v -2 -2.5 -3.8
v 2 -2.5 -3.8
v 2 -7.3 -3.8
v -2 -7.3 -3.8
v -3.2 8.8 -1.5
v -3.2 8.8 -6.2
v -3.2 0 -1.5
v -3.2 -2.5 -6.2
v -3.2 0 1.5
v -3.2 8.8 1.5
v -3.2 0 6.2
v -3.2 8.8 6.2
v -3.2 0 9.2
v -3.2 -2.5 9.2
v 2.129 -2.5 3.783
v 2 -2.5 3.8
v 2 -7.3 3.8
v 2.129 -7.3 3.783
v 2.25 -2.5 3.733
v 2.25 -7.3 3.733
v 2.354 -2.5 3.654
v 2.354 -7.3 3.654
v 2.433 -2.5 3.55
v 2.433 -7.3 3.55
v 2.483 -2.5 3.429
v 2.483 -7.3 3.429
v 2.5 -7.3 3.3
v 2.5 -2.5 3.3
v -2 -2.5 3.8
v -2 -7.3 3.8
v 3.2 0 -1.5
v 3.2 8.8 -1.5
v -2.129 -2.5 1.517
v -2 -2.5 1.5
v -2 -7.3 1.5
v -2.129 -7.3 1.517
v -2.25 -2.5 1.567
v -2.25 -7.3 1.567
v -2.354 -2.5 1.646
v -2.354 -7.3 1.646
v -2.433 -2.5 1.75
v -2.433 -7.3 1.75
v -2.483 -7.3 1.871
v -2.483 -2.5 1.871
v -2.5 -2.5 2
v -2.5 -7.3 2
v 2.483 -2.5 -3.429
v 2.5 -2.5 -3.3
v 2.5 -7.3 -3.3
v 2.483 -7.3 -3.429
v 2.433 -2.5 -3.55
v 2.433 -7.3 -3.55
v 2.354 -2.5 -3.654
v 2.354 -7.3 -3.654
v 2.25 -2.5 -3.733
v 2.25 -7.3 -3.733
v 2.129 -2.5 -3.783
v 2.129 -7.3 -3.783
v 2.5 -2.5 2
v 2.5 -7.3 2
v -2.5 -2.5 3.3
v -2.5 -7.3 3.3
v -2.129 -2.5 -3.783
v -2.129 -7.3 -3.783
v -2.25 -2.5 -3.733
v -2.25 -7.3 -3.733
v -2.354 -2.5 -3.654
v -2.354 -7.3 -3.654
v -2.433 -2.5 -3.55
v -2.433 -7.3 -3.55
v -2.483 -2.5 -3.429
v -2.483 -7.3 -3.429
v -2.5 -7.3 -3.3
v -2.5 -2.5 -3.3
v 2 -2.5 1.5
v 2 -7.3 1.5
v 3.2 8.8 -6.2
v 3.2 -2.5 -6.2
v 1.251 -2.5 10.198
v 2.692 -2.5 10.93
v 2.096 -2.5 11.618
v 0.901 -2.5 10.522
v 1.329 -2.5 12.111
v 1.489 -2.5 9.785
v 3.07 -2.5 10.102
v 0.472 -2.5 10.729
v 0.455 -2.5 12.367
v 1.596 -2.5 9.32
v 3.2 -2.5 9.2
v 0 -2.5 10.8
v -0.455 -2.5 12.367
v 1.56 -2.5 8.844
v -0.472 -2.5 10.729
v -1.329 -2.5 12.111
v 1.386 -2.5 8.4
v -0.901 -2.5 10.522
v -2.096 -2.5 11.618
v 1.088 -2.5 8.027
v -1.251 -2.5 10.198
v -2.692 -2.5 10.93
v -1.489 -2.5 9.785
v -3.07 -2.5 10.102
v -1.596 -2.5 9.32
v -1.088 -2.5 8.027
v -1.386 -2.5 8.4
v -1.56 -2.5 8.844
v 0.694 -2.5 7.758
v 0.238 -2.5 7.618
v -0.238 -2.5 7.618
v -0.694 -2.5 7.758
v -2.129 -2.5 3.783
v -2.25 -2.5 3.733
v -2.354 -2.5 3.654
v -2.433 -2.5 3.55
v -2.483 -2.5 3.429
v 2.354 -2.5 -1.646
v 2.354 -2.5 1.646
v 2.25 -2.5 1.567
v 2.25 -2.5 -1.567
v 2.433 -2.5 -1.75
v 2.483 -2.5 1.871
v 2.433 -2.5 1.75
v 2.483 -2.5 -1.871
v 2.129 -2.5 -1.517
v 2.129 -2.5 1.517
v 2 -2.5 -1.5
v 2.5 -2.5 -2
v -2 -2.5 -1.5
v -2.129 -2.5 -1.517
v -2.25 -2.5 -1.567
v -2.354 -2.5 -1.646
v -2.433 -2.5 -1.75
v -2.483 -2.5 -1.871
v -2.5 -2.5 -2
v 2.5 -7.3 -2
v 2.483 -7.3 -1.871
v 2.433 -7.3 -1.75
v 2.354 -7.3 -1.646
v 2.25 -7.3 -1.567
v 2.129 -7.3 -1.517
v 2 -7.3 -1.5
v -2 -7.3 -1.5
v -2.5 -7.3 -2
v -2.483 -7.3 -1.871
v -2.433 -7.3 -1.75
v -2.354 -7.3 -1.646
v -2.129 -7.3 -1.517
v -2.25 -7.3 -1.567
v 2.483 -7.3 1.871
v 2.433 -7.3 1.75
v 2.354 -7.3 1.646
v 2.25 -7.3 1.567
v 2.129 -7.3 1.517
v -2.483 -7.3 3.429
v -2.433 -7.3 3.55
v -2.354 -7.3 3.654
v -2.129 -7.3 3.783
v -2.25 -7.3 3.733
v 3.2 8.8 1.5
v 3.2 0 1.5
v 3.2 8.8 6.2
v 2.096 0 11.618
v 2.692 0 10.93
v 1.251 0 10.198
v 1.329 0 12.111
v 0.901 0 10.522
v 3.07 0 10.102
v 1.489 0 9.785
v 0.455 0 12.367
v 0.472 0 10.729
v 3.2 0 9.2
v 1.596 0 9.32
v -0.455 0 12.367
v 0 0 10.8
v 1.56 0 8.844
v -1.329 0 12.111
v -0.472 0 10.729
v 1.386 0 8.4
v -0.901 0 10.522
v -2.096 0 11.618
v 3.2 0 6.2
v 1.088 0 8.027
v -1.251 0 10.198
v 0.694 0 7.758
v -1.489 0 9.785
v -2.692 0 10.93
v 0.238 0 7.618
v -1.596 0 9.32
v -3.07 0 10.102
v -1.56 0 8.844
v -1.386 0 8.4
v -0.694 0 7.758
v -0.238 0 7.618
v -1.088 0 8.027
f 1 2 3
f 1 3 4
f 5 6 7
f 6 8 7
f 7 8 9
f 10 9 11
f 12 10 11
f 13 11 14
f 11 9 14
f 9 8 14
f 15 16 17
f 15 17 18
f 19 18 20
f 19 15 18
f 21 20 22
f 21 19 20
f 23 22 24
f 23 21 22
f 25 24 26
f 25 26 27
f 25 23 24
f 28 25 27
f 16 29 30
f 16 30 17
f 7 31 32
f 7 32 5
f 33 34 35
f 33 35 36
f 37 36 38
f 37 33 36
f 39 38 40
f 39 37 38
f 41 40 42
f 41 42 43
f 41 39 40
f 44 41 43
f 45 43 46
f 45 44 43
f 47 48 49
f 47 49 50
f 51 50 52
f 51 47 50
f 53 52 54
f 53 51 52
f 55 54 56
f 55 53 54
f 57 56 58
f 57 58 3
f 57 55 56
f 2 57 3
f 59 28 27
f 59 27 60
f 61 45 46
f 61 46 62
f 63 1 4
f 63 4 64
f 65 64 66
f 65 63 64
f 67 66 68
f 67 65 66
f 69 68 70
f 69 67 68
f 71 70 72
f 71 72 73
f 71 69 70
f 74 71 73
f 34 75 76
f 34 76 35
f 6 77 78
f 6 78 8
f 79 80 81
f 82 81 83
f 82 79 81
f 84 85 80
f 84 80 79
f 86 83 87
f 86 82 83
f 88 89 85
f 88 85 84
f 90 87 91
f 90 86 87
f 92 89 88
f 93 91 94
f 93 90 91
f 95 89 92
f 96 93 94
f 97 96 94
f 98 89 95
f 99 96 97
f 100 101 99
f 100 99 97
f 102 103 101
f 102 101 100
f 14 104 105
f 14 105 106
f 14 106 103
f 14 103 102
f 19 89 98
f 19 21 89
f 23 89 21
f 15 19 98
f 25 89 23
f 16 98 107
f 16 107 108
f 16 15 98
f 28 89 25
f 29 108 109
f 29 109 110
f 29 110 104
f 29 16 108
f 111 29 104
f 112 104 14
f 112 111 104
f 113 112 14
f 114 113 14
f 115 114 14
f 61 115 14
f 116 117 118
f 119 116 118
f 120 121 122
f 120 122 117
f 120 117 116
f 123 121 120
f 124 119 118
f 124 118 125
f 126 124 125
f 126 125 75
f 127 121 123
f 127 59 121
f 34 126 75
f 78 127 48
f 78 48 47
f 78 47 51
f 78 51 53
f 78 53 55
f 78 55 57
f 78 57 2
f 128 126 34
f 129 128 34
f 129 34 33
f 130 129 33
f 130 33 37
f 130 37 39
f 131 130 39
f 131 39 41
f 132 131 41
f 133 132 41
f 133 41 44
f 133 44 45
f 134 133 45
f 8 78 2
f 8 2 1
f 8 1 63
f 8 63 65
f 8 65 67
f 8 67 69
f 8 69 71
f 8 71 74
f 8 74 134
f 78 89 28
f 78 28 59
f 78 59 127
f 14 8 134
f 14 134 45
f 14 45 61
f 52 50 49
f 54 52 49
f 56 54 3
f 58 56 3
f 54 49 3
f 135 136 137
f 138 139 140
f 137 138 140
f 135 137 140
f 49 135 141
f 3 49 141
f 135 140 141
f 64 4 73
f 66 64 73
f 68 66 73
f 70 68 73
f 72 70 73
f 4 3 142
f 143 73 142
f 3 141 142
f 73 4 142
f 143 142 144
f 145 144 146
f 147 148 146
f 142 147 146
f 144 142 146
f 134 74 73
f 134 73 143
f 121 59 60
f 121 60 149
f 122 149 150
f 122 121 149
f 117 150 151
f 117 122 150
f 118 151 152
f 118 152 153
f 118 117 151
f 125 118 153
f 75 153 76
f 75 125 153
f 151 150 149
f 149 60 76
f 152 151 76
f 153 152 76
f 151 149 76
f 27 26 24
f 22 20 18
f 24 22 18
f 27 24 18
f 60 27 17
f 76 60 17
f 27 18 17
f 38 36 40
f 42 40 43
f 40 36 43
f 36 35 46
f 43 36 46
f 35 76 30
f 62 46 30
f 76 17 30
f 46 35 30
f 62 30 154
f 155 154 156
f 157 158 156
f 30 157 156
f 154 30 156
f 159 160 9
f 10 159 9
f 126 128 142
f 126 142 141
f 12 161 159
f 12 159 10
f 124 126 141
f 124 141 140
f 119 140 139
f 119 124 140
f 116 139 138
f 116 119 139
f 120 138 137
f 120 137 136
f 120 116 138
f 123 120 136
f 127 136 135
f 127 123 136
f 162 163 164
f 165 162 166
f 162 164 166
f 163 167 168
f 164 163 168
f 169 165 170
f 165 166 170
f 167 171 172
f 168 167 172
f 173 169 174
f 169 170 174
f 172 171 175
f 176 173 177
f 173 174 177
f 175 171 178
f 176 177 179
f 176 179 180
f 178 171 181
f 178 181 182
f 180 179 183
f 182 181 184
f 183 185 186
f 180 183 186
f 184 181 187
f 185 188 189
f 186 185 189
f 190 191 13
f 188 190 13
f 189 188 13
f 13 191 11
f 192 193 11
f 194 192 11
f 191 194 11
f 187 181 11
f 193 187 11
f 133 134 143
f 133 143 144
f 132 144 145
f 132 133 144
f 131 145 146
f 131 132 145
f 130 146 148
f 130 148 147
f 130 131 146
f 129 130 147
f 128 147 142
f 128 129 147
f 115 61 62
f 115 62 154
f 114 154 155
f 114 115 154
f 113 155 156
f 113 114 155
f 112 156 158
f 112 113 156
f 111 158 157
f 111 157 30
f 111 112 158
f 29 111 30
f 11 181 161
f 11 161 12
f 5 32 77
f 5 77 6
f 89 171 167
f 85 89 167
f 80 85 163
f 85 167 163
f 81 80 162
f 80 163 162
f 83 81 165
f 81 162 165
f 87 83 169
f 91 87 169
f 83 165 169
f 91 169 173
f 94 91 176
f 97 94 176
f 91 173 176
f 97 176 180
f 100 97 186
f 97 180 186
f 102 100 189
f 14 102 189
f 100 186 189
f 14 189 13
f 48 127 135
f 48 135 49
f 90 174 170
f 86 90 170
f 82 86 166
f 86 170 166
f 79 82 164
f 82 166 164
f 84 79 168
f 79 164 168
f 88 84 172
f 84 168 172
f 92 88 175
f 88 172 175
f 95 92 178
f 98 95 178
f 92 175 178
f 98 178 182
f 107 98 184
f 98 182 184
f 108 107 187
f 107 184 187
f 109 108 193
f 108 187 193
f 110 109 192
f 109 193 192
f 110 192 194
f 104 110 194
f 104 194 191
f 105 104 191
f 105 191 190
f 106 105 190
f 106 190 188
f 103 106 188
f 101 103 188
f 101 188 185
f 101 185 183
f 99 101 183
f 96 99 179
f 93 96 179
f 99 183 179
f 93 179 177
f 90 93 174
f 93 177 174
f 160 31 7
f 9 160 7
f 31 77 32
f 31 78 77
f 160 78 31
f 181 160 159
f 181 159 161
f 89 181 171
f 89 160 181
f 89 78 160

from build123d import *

# Parameters (mm, degrees)
ESQUISSE1_R      = 1.6
EXTRUSION1_DEPTH = 2.5
ESQUISSE2_W      = 6.4
ESQUISSE2_H      = 4.7
EXTRUSION2_DEPTH = 8.8
EXTRUSION3_DEPTH = 4.8


with BuildPart() as part:
    # Esquisse1 → Extrusion1 (new body)
    with BuildSketch(Plane(origin=(0, 0, 0), x_dir=(1, 0, 0), z_dir=(0, 1, 0))):
        with BuildLine():
            Line((-3.2, 6.2), (3.2, 6.2))
            Line((3.2, 6.2), (3.2, -9.2))
            ThreePointArc((3.2, -9.2), (0, -12.4), (-3.2, -9.2))
            Line((-3.2, -9.2), (-3.2, 6.2))
        make_face()
        with Locations((0, -9.2)):
            Circle(ESQUISSE1_R, mode=Mode.SUBTRACT)
    extrude(amount=-EXTRUSION1_DEPTH)

    # Esquisse2 → Extrusion2 (add)
    with BuildSketch(Plane(origin=(0, 0, 0), x_dir=(-1, 0, 0), z_dir=(0, 1, 0))):
        with Locations((0, -3.85)):
            Rectangle(ESQUISSE2_W, ESQUISSE2_H)
        with Locations((0, 3.85)):
            Rectangle(ESQUISSE2_W, ESQUISSE2_H)
    extrude(amount=EXTRUSION2_DEPTH)

    # Esquisse3 → Extrusion3 (add)
    with BuildSketch(Plane.XZ.offset(2.5)):
        with BuildLine():
            Line((-2, 3.8), (2, 3.8))
            ThreePointArc((2, 3.8), (2.353553391, 3.653553391), (2.5, 3.3))
            Line((2.5, 3.3), (2.5, 2))
            ThreePointArc((2.5, 2), (2.353553391, 1.646446609), (2, 1.5))
            Line((2, 1.5), (-2, 1.5))
            ThreePointArc((-2, 1.5), (-2.353553391, 1.646446609), (-2.5, 2))
            Line((-2.5, 2), (-2.5, 3.3))
            ThreePointArc((-2.5, 3.3), (-2.353553391, 3.653553391), (-2, 3.8))
        make_face()
        with BuildLine():
            Line((-2, -1.5), (2, -1.5))
            ThreePointArc((2, -1.5), (2.353553391, -1.646446609), (2.5, -2))
            Line((2.5, -2), (2.5, -3.3))
            ThreePointArc((2.5, -3.3), (2.353553391, -3.653553391), (2, -3.8))
            Line((2, -3.8), (-2, -3.8))
            ThreePointArc((-2, -3.8), (-2.353553391, -3.653553391), (-2.5, -3.3))
            Line((-2.5, -3.3), (-2.5, -2))
            ThreePointArc((-2.5, -2), (-2.353553391, -1.646446609), (-2, -1.5))
        make_face()
    extrude(amount=EXTRUSION3_DEPTH)


solid = part.part
